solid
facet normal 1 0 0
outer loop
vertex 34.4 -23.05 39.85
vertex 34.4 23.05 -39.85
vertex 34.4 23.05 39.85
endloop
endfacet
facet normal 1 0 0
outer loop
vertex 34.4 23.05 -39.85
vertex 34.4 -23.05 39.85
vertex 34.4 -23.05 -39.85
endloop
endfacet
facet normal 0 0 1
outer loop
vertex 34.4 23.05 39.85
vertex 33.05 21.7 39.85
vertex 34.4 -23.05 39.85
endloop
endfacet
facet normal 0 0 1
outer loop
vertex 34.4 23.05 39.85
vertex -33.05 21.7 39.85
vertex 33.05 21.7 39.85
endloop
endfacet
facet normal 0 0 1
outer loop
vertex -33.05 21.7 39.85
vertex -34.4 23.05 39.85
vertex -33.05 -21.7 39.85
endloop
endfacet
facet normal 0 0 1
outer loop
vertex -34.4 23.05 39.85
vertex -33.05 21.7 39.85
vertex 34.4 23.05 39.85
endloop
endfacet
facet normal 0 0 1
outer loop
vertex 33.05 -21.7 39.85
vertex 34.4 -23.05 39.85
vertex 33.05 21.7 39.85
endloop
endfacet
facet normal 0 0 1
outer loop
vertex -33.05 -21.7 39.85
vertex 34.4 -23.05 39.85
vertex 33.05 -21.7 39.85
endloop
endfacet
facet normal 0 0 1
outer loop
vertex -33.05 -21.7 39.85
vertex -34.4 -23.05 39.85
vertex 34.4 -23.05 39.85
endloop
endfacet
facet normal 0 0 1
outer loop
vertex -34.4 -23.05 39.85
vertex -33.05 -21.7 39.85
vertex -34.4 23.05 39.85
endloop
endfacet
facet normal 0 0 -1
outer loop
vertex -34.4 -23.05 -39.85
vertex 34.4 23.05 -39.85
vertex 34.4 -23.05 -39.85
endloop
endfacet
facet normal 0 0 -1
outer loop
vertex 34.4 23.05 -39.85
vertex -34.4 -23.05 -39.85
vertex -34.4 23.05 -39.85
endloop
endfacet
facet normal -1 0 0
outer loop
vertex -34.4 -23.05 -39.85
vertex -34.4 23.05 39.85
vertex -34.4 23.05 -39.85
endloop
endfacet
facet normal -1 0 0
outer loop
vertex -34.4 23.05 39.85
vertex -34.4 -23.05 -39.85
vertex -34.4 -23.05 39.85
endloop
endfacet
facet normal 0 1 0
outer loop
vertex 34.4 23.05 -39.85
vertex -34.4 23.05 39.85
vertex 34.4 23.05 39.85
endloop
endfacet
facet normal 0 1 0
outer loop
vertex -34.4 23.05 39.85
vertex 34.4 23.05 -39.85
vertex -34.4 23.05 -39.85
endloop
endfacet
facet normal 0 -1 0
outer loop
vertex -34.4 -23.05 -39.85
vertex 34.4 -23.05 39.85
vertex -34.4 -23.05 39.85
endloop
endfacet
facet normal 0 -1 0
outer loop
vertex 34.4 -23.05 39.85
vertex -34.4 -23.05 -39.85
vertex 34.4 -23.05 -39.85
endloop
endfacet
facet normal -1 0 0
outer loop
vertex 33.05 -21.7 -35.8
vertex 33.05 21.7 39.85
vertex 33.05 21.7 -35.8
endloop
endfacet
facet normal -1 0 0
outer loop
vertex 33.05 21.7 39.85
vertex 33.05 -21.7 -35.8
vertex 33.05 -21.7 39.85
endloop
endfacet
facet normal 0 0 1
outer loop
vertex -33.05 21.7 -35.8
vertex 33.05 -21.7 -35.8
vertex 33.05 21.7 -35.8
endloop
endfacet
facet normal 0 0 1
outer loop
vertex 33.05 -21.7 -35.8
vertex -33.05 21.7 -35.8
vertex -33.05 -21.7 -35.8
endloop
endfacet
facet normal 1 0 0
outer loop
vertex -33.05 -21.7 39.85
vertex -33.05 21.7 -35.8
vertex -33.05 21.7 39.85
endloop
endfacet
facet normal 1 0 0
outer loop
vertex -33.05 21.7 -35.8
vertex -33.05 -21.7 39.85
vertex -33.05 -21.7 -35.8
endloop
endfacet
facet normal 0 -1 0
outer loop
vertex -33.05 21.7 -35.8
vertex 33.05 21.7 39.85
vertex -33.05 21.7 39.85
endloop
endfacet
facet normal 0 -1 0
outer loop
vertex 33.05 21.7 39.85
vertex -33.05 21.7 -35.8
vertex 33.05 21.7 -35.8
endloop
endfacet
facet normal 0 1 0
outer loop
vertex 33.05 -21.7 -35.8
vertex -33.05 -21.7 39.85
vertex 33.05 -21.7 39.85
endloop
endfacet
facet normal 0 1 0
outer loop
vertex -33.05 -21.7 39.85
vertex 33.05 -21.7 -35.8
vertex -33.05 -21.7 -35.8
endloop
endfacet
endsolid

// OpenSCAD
difference() {


    // 外枠（厚み6.5mm）
    translate([0,0,0])
    cube([41 + 9 + 13.4 + 2.7 * 2, 29.5 + 11.2 + 2.7 *2,77+2.7 ], center = true);//外装


    translate([0,0,+2.7])
    cube([41 + 9 + 13.4 + 2.7 * 2 -2.7, 29.5 + 11.2 + 2.7 *2 - 2.7,77 ], center = true);//くりぬき
    }
